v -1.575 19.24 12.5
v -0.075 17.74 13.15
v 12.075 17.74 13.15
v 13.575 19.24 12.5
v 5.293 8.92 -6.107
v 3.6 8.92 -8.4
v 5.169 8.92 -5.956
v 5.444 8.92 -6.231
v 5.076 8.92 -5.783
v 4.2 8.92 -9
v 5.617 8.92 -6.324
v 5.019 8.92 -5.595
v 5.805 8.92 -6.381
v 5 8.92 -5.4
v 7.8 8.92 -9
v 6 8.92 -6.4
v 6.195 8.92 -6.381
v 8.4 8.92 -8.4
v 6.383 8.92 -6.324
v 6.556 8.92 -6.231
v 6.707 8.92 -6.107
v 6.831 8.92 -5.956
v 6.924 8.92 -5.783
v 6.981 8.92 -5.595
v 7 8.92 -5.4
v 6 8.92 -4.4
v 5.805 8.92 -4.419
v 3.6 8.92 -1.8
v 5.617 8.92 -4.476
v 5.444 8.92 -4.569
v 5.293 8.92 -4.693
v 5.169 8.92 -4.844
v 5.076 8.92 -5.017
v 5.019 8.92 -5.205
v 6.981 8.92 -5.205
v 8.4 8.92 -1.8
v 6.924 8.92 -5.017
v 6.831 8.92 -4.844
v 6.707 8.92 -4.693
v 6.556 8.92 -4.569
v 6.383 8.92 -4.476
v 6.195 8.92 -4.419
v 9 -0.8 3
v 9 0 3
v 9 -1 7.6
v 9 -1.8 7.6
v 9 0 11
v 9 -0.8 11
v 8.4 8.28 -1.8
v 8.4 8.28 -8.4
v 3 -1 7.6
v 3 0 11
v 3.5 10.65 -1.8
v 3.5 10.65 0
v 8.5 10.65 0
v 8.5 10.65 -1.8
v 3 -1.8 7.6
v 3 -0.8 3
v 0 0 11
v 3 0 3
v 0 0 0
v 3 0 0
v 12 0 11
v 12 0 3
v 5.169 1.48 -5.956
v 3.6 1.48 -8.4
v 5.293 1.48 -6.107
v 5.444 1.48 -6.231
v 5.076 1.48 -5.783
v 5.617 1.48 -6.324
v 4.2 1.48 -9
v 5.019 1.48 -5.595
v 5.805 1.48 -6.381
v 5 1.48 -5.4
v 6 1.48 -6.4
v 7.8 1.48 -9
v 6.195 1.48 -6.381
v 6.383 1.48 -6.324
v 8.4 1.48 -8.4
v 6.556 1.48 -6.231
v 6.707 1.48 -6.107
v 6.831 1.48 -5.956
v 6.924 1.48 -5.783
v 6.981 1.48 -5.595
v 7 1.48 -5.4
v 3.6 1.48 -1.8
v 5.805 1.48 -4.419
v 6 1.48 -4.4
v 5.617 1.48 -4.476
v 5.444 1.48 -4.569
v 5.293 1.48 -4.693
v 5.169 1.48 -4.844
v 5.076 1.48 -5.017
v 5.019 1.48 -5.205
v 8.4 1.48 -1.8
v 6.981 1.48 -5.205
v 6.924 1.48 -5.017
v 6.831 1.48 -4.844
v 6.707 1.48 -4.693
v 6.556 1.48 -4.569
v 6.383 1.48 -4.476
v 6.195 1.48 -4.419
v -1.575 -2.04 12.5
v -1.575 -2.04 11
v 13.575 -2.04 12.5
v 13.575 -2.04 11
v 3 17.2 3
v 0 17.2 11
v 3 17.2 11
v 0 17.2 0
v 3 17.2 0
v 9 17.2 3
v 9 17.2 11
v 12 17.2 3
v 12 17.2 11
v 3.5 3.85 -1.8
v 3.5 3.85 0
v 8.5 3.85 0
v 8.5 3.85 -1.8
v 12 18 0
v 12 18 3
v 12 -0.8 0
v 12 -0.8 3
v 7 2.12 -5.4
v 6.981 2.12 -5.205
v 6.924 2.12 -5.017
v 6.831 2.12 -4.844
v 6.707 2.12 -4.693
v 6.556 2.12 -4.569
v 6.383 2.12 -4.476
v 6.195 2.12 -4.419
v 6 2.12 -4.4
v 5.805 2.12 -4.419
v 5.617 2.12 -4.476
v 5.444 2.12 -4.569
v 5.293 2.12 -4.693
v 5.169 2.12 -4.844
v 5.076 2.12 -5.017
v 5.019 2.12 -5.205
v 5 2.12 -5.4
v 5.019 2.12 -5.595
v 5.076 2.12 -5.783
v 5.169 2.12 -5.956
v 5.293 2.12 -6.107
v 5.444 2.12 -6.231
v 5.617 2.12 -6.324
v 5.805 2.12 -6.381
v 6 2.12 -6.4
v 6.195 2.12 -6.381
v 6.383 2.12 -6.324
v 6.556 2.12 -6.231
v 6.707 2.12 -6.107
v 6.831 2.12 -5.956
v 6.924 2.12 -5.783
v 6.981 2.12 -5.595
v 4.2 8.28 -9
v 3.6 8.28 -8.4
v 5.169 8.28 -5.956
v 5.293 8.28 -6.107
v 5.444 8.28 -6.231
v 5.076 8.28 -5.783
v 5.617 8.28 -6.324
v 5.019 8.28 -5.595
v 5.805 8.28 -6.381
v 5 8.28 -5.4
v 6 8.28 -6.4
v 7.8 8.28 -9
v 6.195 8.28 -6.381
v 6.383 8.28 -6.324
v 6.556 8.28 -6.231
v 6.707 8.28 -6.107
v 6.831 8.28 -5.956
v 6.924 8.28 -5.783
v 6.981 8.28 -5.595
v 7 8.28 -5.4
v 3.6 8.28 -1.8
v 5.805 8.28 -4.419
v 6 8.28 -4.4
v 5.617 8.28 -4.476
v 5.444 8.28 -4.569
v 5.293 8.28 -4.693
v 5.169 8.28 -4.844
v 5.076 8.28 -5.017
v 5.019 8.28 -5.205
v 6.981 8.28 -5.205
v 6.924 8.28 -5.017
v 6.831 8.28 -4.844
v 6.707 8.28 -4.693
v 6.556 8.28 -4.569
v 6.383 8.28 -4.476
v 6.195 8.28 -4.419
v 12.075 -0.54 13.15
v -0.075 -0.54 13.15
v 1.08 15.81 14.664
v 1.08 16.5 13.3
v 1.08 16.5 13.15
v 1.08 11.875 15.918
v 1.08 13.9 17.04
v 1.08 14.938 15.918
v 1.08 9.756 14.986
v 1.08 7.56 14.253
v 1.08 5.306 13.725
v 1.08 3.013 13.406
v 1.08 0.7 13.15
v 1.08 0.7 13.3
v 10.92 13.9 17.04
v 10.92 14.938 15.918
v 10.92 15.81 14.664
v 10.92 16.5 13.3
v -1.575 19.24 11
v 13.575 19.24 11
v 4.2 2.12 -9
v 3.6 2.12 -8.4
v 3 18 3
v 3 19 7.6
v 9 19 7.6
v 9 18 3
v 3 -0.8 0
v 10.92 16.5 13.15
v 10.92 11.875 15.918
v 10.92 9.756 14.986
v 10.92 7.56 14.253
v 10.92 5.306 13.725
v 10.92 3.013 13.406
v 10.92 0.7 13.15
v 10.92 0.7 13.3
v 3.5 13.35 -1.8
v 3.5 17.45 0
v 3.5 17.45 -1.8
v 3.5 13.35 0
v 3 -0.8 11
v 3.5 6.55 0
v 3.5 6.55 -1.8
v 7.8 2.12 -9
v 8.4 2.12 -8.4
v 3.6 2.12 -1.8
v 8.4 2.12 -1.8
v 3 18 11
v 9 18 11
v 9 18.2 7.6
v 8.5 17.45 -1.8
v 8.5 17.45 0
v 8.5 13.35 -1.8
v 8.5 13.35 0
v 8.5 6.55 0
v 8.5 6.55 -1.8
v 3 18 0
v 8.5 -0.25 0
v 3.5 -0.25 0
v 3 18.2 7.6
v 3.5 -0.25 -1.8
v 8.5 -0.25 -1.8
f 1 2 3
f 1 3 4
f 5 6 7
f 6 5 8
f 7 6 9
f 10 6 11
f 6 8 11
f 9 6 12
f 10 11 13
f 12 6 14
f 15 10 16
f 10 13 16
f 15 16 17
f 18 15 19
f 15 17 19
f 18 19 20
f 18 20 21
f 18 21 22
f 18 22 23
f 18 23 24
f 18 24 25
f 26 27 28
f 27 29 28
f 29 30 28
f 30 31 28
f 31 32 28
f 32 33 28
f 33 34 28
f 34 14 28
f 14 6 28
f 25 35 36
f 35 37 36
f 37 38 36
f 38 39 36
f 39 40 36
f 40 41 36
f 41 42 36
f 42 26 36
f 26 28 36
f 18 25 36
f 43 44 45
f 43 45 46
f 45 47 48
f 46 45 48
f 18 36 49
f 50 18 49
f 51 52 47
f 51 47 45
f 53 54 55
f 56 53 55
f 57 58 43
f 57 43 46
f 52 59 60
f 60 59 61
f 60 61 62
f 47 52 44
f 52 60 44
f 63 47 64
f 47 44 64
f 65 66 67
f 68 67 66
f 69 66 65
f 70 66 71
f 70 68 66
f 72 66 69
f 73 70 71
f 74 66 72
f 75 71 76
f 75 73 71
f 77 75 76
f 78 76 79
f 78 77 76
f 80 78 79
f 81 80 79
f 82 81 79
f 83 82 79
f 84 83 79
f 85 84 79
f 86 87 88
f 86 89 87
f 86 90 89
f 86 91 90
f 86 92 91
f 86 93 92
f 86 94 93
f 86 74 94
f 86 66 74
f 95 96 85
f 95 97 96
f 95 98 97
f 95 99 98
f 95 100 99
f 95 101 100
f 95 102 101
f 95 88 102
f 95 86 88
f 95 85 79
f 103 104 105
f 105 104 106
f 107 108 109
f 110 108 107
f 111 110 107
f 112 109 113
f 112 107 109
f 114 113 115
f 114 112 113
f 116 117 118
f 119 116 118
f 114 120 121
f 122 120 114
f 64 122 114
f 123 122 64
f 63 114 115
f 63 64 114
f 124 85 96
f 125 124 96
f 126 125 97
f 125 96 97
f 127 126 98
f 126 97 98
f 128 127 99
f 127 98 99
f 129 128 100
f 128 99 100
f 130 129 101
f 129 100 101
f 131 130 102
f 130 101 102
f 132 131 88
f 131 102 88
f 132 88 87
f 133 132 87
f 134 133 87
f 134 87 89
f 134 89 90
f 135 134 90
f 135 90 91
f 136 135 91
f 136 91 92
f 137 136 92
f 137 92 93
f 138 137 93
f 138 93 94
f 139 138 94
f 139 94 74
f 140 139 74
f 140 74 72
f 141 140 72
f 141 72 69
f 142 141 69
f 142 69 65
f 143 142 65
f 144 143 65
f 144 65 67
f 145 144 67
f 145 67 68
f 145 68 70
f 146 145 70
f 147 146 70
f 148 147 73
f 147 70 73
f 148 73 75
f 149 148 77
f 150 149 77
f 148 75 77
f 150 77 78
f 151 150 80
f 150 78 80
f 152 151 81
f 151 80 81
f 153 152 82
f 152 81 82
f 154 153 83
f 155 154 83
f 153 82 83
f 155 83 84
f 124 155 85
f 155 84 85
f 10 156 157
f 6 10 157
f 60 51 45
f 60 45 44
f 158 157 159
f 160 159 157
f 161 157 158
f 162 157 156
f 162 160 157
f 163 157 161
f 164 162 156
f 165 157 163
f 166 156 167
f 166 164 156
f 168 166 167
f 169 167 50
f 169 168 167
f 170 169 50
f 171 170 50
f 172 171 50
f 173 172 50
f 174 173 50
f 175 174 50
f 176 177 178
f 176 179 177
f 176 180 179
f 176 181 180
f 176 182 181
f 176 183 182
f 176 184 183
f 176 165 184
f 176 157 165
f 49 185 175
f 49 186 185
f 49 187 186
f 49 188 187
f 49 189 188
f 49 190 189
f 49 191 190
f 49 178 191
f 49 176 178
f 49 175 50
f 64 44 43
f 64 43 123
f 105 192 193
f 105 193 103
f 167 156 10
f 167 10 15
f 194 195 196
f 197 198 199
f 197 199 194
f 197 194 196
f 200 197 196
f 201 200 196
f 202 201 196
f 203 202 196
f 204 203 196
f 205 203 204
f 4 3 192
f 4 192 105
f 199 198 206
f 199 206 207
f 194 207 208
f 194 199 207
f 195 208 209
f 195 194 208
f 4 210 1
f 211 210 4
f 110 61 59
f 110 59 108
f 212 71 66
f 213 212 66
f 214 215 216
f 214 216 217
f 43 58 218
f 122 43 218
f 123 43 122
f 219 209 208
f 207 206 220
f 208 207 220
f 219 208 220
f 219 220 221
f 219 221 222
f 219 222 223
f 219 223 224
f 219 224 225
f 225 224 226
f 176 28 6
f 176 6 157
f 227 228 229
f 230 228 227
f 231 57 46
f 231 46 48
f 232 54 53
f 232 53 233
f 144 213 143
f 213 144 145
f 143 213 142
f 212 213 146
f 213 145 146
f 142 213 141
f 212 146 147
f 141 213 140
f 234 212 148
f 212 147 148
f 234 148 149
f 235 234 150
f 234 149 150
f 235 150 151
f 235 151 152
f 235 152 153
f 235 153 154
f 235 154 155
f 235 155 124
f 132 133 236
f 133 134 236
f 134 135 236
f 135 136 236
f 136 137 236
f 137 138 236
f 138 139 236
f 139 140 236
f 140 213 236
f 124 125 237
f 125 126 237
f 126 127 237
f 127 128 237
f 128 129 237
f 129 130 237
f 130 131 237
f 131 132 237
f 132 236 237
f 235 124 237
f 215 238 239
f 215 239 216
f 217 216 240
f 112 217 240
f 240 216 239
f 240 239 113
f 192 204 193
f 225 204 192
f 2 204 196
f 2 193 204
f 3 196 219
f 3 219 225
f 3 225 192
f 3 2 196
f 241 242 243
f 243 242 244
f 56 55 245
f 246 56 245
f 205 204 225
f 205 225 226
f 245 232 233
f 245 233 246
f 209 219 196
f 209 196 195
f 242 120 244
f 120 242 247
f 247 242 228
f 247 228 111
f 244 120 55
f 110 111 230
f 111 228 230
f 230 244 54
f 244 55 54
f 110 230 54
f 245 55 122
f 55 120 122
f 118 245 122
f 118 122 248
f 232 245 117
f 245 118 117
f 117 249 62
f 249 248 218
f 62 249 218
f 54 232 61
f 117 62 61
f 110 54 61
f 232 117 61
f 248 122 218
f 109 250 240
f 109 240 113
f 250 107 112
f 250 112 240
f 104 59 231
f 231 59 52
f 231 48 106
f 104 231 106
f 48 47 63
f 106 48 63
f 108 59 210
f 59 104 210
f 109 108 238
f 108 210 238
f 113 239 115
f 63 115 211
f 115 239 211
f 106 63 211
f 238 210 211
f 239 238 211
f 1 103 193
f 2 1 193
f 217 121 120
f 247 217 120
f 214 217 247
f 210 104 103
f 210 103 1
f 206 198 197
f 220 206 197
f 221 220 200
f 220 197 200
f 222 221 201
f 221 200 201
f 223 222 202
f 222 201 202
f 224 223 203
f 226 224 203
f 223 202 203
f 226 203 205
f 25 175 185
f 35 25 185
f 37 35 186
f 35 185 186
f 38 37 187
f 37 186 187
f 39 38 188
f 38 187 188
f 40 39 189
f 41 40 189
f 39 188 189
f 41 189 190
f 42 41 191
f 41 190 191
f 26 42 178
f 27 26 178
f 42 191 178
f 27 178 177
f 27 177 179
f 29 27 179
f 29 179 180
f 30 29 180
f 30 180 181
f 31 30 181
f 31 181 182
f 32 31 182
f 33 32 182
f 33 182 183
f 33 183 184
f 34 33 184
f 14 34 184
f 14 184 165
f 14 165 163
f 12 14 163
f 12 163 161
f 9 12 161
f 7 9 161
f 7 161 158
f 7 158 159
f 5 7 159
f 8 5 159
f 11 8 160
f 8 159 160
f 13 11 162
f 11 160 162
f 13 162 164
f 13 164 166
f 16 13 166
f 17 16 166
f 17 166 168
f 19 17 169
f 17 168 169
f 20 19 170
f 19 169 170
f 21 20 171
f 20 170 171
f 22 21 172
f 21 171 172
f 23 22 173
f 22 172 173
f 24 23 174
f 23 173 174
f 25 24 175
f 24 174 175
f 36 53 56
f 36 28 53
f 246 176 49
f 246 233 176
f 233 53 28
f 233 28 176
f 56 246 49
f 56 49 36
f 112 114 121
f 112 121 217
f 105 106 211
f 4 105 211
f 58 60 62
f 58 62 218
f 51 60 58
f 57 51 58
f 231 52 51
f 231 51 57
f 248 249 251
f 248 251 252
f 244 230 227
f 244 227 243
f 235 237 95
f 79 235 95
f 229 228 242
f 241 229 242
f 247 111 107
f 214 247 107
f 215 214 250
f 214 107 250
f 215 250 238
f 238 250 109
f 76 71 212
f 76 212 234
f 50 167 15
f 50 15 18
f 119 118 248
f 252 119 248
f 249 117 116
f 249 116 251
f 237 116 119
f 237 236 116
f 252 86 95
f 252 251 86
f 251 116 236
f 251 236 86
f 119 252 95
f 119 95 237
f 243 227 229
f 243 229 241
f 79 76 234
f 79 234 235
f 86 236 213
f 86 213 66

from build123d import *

# Parameters (mm, degrees)
SKETCH001_W      = 9
SKETCH001_H      = 3
EXTRUDE001_DEPTH = 0.8
SKETCH002_W      = 9
SKETCH002_H      = 3
EXTRUDE002_DEPTH = 0.8
EXTRUDE005_DEPTH = 15.15
EXTRUDE004_DEPTH = 21.28
SKETCH003_W      = 15.15
SKETCH003_H      = 21.28
EXTRUDE003_DEPTH = 2.15
EXTRUDE006_DEPTH = 6
EXTRUDE007_DEPTH = 9.84
SKETCH008_W      = 5
SKETCH008_H      = 4.1
EXTRUDE008_DEPTH = 1.8
SKETCH010_R      = 1
EXTRUDE010_DEPTH = 8
SKETCH009_W      = 4.8
SKETCH009_H      = 0.64
EXTRUDE009_DEPTH = 7.2
SKETCH_W         = 12
SKETCH_H         = 17.2
EXTRUDE_DEPTH    = 11


with BuildPart() as extrude001:
    # Sketch001 (on Face1 of Extrude) → Extrude001 (new body)
    with BuildSketch(Plane.XZ):
        with Locations((7.5, 1.5)):
            Rectangle(SKETCH001_W, SKETCH001_H)
    extrude(amount=EXTRUDE001_DEPTH)


with BuildPart() as extrude002:
    # Sketch002 (on Face3 of Extrude) → Extrude002 (new body)
    with BuildSketch(Plane(origin=(0, 17.2, 0), x_dir=(-1, 0, 0), z_dir=(0, 1, 0))):
        with Locations((-7.5, 1.5)):
            Rectangle(SKETCH002_W, SKETCH002_H)
    extrude(amount=EXTRUDE002_DEPTH)


with BuildPart() as extrude005:
    # Sketch005 (on Face3 of Extrude003) → Extrude005 (new body)
    with BuildSketch(Plane.YZ.offset(13.575)):
        Polygon((19.24, 13.15), (17.74, 13.15), (19.24, 12.5), align=None)
        Polygon((-2.04, 13.15), (-0.54, 13.15), (-2.04, 12.5), align=None)
    extrude(amount=-EXTRUDE005_DEPTH)


with BuildPart() as fusion:
    # Sketch004 (on Face4 of Extrude003) → Extrude004 (new body)
    with BuildSketch(Plane(origin=(0, 19.24, 0), x_dir=(-1, 0, 0), z_dir=(0, 1, 0))):
        Polygon((-12.075, 13.15), (-13.575, 12.5), (-13.575, 13.15), align=None)
        Polygon((1.575, 13.15), (1.575, 12.5), (0.075, 13.15), align=None)
    extrude(amount=-EXTRUDE004_DEPTH)

    # Fusion: union Extrude005
    add(extrude005.part)


with BuildPart() as cut:
    # Sketch003 (on Face6 of Extrude) → Extrude003 (new body)
    with BuildSketch(Plane.XY.offset(11)):
        with Locations((6, 8.6)):
            Rectangle(SKETCH003_W, SKETCH003_H)
    extrude(amount=EXTRUDE003_DEPTH)

    # Cut: cut Fusion
    add(fusion.part, mode=Mode.SUBTRACT)


with BuildPart() as extrude006:
    # Sketch006 (on Face2 of Extrude) → Extrude006 (new body)
    with BuildSketch(Plane.YZ.offset(3)):
        Polygon((17.2, 3), (18.2, 7.6), (17.2, 11), (18, 11), (19, 7.6), (18, 3), align=None)
        Polygon((-0.8, 3), (-1.8, 7.6), (-0.8, 11), (0, 11), (-1, 7.6), (0, 3), align=None)
    extrude(amount=EXTRUDE006_DEPTH)


with BuildPart() as extrude007:
    # Sketch007 (on Face4 of Extrude) → Extrude007 (new body)
    with BuildSketch(Plane(origin=(1.08, 0, 0), x_dir=(0, -1, 0), z_dir=(-1, 0, 0))):
        with BuildLine():
            Line((-0.7, 11), (-0.7, 13.3))
            ThreePointArc((-13.9, 17.04), (-7.559803, 14.253048), (-0.7, 13.3))
            ThreePointArc((-13.9, 17.04), (-15.395706, 15.306052), (-16.5, 13.3))
            Line((-16.5, 11), (-16.5, 13.3))
            Line((-16.5, 11), (-0.7, 11))
        make_face()
    extrude(amount=-EXTRUDE007_DEPTH)


with BuildPart() as extrude008:
    # Sketch008 (on Face5 of Extrude) → Extrude008 (new body)
    with BuildSketch(Plane(origin=(0, 0, 0), x_dir=(1, 0, 0), z_dir=(0, 0, -1))):
        with Locations((6, -1.8)):
            Rectangle(SKETCH008_W, SKETCH008_H)
        with Locations((6, -8.6)):
            Rectangle(SKETCH008_W, SKETCH008_H)
        with Locations((6, -15.4)):
            Rectangle(SKETCH008_W, SKETCH008_H)
    extrude(amount=EXTRUDE008_DEPTH)


with BuildPart() as extrude010:
    # Sketch010 (on Face10 of Extrude009) → Extrude010 (new body)
    with BuildSketch(Plane.XZ.offset(-1.48)):
        with Locations((6, -5.4)):
            Circle(SKETCH010_R)
        Polygon((3.6, -9), (4.2, -9), (3.6, -8.4), align=None)
        Polygon((8.4, -9), (7.8, -9), (8.4, -8.4), align=None)
    extrude(amount=-EXTRUDE010_DEPTH)


with BuildPart() as cut001:
    # Sketch009 (on Face6 of Extrude008) → Extrude009 (new body)
    with BuildSketch(Plane(origin=(0, 0, -1.8), x_dir=(1, 0, 0), z_dir=(0, 0, -1))):
        with Locations((6, -1.8)):
            Rectangle(SKETCH009_W, SKETCH009_H)
        with Locations((6, -8.6)):
            Rectangle(SKETCH009_W, SKETCH009_H)
    extrude(amount=EXTRUDE009_DEPTH)

    # Cut001: cut Extrude010
    add(extrude010.part, mode=Mode.SUBTRACT)


with BuildPart() as fusion001:
    # Sketch → Extrude (new body)
    with BuildSketch(Plane.XY):
        with Locations((6, 8.6)):
            Rectangle(SKETCH_W, SKETCH_H)
    extrude(amount=EXTRUDE_DEPTH)

    # Fusion001: union Extrude001, Extrude002, Cut, Extrude006, Extrude007, Extrude008, Cut001
    add(extrude001.part)
    add(extrude002.part)
    add(cut.part)
    add(extrude006.part)
    add(extrude007.part)
    add(extrude008.part)
    add(cut001.part)


solid = fusion001.part
